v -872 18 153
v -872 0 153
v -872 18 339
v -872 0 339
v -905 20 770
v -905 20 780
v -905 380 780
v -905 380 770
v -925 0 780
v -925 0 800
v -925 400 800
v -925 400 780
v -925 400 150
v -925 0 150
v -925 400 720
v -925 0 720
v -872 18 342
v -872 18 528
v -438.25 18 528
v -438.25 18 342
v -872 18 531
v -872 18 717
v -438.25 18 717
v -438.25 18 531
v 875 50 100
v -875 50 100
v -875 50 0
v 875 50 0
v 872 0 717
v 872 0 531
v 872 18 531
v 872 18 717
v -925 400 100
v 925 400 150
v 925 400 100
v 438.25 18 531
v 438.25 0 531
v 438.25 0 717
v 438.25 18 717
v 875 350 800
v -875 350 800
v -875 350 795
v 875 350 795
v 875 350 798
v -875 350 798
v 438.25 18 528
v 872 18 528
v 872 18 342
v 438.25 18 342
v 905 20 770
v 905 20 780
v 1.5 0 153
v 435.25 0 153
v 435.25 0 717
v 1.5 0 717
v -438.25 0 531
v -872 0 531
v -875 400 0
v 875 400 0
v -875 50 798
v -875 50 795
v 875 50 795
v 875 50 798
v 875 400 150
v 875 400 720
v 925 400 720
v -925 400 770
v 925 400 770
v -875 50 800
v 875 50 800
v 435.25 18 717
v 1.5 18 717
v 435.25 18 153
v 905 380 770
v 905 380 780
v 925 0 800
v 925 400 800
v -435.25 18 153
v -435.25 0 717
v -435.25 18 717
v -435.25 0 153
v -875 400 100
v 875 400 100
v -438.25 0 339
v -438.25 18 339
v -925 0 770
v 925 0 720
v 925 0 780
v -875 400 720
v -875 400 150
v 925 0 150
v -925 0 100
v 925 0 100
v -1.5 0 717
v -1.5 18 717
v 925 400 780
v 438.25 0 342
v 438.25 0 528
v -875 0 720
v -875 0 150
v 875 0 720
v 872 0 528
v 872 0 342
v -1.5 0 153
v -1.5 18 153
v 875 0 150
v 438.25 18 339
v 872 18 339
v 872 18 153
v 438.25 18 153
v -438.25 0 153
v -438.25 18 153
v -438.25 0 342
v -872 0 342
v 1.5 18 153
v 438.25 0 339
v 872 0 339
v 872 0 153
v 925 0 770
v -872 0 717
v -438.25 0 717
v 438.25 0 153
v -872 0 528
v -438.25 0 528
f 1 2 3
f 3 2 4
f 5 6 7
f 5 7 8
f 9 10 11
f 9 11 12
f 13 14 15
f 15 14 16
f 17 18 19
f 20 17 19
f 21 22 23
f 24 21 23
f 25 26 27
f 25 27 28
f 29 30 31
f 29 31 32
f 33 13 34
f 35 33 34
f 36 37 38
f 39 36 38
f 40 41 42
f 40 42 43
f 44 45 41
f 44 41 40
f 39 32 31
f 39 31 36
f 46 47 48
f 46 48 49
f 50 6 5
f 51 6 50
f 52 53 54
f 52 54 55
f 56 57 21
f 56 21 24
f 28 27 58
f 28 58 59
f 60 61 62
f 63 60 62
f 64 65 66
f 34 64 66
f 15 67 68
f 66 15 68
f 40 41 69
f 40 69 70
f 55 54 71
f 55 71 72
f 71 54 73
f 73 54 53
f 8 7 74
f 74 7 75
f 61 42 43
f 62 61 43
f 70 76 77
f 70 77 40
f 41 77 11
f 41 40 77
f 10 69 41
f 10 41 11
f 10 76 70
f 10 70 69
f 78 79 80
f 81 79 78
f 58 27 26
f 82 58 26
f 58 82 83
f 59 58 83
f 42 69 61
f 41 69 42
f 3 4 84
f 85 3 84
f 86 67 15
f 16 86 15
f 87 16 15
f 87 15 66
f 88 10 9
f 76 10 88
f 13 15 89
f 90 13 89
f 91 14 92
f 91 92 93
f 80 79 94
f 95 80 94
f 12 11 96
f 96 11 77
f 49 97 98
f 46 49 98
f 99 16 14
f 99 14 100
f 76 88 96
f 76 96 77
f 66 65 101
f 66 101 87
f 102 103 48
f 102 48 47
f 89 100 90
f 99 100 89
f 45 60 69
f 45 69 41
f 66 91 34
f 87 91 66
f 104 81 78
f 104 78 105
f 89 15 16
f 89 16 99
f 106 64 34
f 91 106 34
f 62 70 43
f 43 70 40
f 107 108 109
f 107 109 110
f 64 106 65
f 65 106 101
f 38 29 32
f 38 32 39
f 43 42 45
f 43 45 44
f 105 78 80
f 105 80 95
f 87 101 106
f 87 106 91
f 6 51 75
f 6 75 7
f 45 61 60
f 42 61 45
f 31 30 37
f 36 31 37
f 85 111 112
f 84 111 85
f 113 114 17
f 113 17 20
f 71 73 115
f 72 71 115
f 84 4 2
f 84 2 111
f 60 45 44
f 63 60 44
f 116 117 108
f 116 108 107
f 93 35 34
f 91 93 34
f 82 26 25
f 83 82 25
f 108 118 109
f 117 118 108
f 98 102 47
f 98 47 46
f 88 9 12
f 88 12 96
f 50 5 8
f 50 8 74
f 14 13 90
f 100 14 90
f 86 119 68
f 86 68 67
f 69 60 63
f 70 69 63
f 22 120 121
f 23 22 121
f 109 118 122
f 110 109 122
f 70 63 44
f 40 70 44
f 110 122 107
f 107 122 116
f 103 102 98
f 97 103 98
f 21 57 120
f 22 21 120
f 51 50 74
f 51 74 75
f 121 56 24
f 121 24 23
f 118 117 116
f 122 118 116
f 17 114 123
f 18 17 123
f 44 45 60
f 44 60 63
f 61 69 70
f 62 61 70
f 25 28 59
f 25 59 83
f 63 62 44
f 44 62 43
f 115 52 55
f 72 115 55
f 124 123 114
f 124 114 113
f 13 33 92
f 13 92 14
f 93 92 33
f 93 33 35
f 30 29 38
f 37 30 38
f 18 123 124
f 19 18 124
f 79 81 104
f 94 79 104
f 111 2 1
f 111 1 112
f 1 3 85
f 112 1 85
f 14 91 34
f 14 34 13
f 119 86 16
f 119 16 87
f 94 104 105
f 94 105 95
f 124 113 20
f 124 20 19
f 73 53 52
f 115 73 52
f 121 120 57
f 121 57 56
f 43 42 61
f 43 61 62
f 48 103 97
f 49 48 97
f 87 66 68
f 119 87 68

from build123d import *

# Parameters (mm, degrees)
F1_DEPTH  = 400
F0_W      = 50
F0_H      = 50
F0_W_2    = 1750
F0_H_2    = 570
F2_DEPTH  = 400
F3_START  = -50
F0_H_3    = 100
F3_DEPTH  = 350
F0_W_3    = 433.75
F0_H_4    = 186
F4_DEPTH  = 18
F0_H_5    = 3
F5_START  = -20
F5_DEPTH  = 360
F6_DEPTH  = 400
F9_W      = 1750
F9_H      = 300
F10_DEPTH = 5
F11_DEPTH = 3
F12_DEPTH = 2


# Not quite as in the source:
# - a feature names something its author has since deleted; it is built from what else it names


with BuildPart() as f1:
    # F0 (on Front) → F1 (new body)
    with BuildSketch(Plane.XZ):
        Polygon((905, 770), (-875, 770), (-875, 720), (-872, 720), (875, 720), (925, 720), (925, 770), align=None)
        Polygon((-905, 770), (-925, 770), (-925, 720), (-875, 720), (-875, 770), align=None)
    extrude(amount=-F1_DEPTH)


with BuildPart() as f1b:
    # F0 (on Front) → F1, piece 2 (new body)
    with BuildSketch(Plane.XZ):
        with Locations((-900, 125)):
            Rectangle(F0_W, F0_H)
        with Locations((0, 125)):
            Rectangle(F0_W_2, F0_H)
        with Locations((900, 125)):
            Rectangle(F0_W, F0_H)
    extrude(amount=-F1_DEPTH)


with BuildPart() as f2:
    # F0 (on Front) → F2 (new body)
    with BuildSketch(Plane.XZ):
        with Locations((-900, 435)):
            Rectangle(F0_W, F0_H_2)
    extrude(amount=-F2_DEPTH)


with BuildPart() as f2b:
    # F0 (on Front) → F2, piece 2 (new body)
    with BuildSketch(Plane.XZ):
        with Locations((900, 435)):
            Rectangle(F0_W, F0_H_2)
    extrude(amount=-F2_DEPTH)


with BuildPart() as f3:
    # F0 (on Front) → F3 (new body)
    with BuildSketch(Plane.XZ.offset(F3_START)):
        with Locations((0, 50)):
            Rectangle(F0_W_2, F0_H_3)
    extrude(amount=-F3_DEPTH)


with BuildPart() as f4:
    # F0 (on Front) → F4 (new body)
    with BuildSketch(Plane.XZ):
        with Locations((-655.125, 435)):
            Rectangle(F0_W_3, F0_H_4)
    extrude(amount=-F4_DEPTH)


with BuildPart() as f4b:
    # F0 (on Front) → F4, piece 2 (new body)
    with BuildSketch(Plane.XZ):
        with Locations((-655.125, 246)):
            Rectangle(F0_W_3, F0_H_4)
    extrude(amount=-F4_DEPTH)


with BuildPart() as f4c:
    # F0 (on Front) → F4, piece 3 (new body)
    with BuildSketch(Plane.XZ):
        with Locations((-218.375, 435)):
            Rectangle(F0_W_3, F0_H_4)
        with Locations((-218.375, 246)):
            Rectangle(F0_W_3, F0_H_4)
        with Locations((-218.375, 340.5)):
            Rectangle(F0_W_3, F0_H_5)
        with Locations((-218.375, 624)):
            Rectangle(F0_W_3, F0_H_4)
        with Locations((-218.375, 529.5)):
            Rectangle(F0_W_3, F0_H_5)
    extrude(amount=-F4_DEPTH)


with BuildPart() as f4d:
    # F0 (on Front) → F4, piece 4 (new body)
    with BuildSketch(Plane.XZ):
        with Locations((-655.125, 624)):
            Rectangle(F0_W_3, F0_H_4)
    extrude(amount=-F4_DEPTH)


with BuildPart() as f5:
    # F0 (on Front) → F5 (new body)
    with BuildSketch(Plane.XZ.offset(F5_START)):
        Polygon((-905, 780), (-905, 770), (-875, 770), (905, 770), (905, 780), align=None)
    extrude(amount=-F5_DEPTH)


with BuildPart() as f6:
    # F0 (on Front) → F6 (new body)
    with BuildSketch(Plane.XZ):
        Polygon((-925, 780), (-905, 780), (905, 780), (925, 780), (925, 800), (-925, 800), align=None)
    extrude(amount=-F6_DEPTH)

    # F9 (on face) → F10 (cut)
    with BuildSketch(Plane.XY.offset(800)):
        with Locations((0, 200)):
            Rectangle(F9_W, F9_H)
    extrude(amount=-F10_DEPTH, mode=Mode.SUBTRACT)


with BuildPart() as f8_1:
    # F8: instance of F4d
    add(f4d.part.mirror(Plane(origin=(0, 9, 435), x_dir=(0, 1, 0), z_dir=(1, 0, 0))))


with BuildPart() as f8_2:
    # F8: instance of F4
    add(f4.part.mirror(Plane(origin=(0, 9, 435), x_dir=(0, 1, 0), z_dir=(1, 0, 0))))


with BuildPart() as f8_3:
    # F8: instance of F4b
    add(f4b.part.mirror(Plane(origin=(0, 9, 435), x_dir=(0, 1, 0), z_dir=(1, 0, 0))))


with BuildPart() as f8_4:
    # F8: instance of F4c
    add(f4c.part.mirror(Plane(origin=(0, 9, 435), x_dir=(0, 1, 0), z_dir=(1, 0, 0))))


with BuildPart() as f11:
    # F11 (new): a face of the model
    f11_faces = [f6.part.faces().sort_by_distance(p)[0] for p in [
        (0, 200, 795),
    ]]
    extrude(f11_faces, amount=F11_DEPTH)


with BuildPart() as f12:
    # F12 (new): a face of the model
    f12_faces = [f11.part.faces().sort_by_distance(p)[0] for p in [
        (0, 200, 798),
    ]]
    extrude(f12_faces, amount=F12_DEPTH)


solid = Compound([f1.part, f1b.part, f2.part, f2b.part, f3.part, f4.part, f4b.part, f4c.part, f4d.part, f5.part, f6.part, f8_1.part, f8_2.part, f8_3.part, f8_4.part, f11.part, f12.part])
